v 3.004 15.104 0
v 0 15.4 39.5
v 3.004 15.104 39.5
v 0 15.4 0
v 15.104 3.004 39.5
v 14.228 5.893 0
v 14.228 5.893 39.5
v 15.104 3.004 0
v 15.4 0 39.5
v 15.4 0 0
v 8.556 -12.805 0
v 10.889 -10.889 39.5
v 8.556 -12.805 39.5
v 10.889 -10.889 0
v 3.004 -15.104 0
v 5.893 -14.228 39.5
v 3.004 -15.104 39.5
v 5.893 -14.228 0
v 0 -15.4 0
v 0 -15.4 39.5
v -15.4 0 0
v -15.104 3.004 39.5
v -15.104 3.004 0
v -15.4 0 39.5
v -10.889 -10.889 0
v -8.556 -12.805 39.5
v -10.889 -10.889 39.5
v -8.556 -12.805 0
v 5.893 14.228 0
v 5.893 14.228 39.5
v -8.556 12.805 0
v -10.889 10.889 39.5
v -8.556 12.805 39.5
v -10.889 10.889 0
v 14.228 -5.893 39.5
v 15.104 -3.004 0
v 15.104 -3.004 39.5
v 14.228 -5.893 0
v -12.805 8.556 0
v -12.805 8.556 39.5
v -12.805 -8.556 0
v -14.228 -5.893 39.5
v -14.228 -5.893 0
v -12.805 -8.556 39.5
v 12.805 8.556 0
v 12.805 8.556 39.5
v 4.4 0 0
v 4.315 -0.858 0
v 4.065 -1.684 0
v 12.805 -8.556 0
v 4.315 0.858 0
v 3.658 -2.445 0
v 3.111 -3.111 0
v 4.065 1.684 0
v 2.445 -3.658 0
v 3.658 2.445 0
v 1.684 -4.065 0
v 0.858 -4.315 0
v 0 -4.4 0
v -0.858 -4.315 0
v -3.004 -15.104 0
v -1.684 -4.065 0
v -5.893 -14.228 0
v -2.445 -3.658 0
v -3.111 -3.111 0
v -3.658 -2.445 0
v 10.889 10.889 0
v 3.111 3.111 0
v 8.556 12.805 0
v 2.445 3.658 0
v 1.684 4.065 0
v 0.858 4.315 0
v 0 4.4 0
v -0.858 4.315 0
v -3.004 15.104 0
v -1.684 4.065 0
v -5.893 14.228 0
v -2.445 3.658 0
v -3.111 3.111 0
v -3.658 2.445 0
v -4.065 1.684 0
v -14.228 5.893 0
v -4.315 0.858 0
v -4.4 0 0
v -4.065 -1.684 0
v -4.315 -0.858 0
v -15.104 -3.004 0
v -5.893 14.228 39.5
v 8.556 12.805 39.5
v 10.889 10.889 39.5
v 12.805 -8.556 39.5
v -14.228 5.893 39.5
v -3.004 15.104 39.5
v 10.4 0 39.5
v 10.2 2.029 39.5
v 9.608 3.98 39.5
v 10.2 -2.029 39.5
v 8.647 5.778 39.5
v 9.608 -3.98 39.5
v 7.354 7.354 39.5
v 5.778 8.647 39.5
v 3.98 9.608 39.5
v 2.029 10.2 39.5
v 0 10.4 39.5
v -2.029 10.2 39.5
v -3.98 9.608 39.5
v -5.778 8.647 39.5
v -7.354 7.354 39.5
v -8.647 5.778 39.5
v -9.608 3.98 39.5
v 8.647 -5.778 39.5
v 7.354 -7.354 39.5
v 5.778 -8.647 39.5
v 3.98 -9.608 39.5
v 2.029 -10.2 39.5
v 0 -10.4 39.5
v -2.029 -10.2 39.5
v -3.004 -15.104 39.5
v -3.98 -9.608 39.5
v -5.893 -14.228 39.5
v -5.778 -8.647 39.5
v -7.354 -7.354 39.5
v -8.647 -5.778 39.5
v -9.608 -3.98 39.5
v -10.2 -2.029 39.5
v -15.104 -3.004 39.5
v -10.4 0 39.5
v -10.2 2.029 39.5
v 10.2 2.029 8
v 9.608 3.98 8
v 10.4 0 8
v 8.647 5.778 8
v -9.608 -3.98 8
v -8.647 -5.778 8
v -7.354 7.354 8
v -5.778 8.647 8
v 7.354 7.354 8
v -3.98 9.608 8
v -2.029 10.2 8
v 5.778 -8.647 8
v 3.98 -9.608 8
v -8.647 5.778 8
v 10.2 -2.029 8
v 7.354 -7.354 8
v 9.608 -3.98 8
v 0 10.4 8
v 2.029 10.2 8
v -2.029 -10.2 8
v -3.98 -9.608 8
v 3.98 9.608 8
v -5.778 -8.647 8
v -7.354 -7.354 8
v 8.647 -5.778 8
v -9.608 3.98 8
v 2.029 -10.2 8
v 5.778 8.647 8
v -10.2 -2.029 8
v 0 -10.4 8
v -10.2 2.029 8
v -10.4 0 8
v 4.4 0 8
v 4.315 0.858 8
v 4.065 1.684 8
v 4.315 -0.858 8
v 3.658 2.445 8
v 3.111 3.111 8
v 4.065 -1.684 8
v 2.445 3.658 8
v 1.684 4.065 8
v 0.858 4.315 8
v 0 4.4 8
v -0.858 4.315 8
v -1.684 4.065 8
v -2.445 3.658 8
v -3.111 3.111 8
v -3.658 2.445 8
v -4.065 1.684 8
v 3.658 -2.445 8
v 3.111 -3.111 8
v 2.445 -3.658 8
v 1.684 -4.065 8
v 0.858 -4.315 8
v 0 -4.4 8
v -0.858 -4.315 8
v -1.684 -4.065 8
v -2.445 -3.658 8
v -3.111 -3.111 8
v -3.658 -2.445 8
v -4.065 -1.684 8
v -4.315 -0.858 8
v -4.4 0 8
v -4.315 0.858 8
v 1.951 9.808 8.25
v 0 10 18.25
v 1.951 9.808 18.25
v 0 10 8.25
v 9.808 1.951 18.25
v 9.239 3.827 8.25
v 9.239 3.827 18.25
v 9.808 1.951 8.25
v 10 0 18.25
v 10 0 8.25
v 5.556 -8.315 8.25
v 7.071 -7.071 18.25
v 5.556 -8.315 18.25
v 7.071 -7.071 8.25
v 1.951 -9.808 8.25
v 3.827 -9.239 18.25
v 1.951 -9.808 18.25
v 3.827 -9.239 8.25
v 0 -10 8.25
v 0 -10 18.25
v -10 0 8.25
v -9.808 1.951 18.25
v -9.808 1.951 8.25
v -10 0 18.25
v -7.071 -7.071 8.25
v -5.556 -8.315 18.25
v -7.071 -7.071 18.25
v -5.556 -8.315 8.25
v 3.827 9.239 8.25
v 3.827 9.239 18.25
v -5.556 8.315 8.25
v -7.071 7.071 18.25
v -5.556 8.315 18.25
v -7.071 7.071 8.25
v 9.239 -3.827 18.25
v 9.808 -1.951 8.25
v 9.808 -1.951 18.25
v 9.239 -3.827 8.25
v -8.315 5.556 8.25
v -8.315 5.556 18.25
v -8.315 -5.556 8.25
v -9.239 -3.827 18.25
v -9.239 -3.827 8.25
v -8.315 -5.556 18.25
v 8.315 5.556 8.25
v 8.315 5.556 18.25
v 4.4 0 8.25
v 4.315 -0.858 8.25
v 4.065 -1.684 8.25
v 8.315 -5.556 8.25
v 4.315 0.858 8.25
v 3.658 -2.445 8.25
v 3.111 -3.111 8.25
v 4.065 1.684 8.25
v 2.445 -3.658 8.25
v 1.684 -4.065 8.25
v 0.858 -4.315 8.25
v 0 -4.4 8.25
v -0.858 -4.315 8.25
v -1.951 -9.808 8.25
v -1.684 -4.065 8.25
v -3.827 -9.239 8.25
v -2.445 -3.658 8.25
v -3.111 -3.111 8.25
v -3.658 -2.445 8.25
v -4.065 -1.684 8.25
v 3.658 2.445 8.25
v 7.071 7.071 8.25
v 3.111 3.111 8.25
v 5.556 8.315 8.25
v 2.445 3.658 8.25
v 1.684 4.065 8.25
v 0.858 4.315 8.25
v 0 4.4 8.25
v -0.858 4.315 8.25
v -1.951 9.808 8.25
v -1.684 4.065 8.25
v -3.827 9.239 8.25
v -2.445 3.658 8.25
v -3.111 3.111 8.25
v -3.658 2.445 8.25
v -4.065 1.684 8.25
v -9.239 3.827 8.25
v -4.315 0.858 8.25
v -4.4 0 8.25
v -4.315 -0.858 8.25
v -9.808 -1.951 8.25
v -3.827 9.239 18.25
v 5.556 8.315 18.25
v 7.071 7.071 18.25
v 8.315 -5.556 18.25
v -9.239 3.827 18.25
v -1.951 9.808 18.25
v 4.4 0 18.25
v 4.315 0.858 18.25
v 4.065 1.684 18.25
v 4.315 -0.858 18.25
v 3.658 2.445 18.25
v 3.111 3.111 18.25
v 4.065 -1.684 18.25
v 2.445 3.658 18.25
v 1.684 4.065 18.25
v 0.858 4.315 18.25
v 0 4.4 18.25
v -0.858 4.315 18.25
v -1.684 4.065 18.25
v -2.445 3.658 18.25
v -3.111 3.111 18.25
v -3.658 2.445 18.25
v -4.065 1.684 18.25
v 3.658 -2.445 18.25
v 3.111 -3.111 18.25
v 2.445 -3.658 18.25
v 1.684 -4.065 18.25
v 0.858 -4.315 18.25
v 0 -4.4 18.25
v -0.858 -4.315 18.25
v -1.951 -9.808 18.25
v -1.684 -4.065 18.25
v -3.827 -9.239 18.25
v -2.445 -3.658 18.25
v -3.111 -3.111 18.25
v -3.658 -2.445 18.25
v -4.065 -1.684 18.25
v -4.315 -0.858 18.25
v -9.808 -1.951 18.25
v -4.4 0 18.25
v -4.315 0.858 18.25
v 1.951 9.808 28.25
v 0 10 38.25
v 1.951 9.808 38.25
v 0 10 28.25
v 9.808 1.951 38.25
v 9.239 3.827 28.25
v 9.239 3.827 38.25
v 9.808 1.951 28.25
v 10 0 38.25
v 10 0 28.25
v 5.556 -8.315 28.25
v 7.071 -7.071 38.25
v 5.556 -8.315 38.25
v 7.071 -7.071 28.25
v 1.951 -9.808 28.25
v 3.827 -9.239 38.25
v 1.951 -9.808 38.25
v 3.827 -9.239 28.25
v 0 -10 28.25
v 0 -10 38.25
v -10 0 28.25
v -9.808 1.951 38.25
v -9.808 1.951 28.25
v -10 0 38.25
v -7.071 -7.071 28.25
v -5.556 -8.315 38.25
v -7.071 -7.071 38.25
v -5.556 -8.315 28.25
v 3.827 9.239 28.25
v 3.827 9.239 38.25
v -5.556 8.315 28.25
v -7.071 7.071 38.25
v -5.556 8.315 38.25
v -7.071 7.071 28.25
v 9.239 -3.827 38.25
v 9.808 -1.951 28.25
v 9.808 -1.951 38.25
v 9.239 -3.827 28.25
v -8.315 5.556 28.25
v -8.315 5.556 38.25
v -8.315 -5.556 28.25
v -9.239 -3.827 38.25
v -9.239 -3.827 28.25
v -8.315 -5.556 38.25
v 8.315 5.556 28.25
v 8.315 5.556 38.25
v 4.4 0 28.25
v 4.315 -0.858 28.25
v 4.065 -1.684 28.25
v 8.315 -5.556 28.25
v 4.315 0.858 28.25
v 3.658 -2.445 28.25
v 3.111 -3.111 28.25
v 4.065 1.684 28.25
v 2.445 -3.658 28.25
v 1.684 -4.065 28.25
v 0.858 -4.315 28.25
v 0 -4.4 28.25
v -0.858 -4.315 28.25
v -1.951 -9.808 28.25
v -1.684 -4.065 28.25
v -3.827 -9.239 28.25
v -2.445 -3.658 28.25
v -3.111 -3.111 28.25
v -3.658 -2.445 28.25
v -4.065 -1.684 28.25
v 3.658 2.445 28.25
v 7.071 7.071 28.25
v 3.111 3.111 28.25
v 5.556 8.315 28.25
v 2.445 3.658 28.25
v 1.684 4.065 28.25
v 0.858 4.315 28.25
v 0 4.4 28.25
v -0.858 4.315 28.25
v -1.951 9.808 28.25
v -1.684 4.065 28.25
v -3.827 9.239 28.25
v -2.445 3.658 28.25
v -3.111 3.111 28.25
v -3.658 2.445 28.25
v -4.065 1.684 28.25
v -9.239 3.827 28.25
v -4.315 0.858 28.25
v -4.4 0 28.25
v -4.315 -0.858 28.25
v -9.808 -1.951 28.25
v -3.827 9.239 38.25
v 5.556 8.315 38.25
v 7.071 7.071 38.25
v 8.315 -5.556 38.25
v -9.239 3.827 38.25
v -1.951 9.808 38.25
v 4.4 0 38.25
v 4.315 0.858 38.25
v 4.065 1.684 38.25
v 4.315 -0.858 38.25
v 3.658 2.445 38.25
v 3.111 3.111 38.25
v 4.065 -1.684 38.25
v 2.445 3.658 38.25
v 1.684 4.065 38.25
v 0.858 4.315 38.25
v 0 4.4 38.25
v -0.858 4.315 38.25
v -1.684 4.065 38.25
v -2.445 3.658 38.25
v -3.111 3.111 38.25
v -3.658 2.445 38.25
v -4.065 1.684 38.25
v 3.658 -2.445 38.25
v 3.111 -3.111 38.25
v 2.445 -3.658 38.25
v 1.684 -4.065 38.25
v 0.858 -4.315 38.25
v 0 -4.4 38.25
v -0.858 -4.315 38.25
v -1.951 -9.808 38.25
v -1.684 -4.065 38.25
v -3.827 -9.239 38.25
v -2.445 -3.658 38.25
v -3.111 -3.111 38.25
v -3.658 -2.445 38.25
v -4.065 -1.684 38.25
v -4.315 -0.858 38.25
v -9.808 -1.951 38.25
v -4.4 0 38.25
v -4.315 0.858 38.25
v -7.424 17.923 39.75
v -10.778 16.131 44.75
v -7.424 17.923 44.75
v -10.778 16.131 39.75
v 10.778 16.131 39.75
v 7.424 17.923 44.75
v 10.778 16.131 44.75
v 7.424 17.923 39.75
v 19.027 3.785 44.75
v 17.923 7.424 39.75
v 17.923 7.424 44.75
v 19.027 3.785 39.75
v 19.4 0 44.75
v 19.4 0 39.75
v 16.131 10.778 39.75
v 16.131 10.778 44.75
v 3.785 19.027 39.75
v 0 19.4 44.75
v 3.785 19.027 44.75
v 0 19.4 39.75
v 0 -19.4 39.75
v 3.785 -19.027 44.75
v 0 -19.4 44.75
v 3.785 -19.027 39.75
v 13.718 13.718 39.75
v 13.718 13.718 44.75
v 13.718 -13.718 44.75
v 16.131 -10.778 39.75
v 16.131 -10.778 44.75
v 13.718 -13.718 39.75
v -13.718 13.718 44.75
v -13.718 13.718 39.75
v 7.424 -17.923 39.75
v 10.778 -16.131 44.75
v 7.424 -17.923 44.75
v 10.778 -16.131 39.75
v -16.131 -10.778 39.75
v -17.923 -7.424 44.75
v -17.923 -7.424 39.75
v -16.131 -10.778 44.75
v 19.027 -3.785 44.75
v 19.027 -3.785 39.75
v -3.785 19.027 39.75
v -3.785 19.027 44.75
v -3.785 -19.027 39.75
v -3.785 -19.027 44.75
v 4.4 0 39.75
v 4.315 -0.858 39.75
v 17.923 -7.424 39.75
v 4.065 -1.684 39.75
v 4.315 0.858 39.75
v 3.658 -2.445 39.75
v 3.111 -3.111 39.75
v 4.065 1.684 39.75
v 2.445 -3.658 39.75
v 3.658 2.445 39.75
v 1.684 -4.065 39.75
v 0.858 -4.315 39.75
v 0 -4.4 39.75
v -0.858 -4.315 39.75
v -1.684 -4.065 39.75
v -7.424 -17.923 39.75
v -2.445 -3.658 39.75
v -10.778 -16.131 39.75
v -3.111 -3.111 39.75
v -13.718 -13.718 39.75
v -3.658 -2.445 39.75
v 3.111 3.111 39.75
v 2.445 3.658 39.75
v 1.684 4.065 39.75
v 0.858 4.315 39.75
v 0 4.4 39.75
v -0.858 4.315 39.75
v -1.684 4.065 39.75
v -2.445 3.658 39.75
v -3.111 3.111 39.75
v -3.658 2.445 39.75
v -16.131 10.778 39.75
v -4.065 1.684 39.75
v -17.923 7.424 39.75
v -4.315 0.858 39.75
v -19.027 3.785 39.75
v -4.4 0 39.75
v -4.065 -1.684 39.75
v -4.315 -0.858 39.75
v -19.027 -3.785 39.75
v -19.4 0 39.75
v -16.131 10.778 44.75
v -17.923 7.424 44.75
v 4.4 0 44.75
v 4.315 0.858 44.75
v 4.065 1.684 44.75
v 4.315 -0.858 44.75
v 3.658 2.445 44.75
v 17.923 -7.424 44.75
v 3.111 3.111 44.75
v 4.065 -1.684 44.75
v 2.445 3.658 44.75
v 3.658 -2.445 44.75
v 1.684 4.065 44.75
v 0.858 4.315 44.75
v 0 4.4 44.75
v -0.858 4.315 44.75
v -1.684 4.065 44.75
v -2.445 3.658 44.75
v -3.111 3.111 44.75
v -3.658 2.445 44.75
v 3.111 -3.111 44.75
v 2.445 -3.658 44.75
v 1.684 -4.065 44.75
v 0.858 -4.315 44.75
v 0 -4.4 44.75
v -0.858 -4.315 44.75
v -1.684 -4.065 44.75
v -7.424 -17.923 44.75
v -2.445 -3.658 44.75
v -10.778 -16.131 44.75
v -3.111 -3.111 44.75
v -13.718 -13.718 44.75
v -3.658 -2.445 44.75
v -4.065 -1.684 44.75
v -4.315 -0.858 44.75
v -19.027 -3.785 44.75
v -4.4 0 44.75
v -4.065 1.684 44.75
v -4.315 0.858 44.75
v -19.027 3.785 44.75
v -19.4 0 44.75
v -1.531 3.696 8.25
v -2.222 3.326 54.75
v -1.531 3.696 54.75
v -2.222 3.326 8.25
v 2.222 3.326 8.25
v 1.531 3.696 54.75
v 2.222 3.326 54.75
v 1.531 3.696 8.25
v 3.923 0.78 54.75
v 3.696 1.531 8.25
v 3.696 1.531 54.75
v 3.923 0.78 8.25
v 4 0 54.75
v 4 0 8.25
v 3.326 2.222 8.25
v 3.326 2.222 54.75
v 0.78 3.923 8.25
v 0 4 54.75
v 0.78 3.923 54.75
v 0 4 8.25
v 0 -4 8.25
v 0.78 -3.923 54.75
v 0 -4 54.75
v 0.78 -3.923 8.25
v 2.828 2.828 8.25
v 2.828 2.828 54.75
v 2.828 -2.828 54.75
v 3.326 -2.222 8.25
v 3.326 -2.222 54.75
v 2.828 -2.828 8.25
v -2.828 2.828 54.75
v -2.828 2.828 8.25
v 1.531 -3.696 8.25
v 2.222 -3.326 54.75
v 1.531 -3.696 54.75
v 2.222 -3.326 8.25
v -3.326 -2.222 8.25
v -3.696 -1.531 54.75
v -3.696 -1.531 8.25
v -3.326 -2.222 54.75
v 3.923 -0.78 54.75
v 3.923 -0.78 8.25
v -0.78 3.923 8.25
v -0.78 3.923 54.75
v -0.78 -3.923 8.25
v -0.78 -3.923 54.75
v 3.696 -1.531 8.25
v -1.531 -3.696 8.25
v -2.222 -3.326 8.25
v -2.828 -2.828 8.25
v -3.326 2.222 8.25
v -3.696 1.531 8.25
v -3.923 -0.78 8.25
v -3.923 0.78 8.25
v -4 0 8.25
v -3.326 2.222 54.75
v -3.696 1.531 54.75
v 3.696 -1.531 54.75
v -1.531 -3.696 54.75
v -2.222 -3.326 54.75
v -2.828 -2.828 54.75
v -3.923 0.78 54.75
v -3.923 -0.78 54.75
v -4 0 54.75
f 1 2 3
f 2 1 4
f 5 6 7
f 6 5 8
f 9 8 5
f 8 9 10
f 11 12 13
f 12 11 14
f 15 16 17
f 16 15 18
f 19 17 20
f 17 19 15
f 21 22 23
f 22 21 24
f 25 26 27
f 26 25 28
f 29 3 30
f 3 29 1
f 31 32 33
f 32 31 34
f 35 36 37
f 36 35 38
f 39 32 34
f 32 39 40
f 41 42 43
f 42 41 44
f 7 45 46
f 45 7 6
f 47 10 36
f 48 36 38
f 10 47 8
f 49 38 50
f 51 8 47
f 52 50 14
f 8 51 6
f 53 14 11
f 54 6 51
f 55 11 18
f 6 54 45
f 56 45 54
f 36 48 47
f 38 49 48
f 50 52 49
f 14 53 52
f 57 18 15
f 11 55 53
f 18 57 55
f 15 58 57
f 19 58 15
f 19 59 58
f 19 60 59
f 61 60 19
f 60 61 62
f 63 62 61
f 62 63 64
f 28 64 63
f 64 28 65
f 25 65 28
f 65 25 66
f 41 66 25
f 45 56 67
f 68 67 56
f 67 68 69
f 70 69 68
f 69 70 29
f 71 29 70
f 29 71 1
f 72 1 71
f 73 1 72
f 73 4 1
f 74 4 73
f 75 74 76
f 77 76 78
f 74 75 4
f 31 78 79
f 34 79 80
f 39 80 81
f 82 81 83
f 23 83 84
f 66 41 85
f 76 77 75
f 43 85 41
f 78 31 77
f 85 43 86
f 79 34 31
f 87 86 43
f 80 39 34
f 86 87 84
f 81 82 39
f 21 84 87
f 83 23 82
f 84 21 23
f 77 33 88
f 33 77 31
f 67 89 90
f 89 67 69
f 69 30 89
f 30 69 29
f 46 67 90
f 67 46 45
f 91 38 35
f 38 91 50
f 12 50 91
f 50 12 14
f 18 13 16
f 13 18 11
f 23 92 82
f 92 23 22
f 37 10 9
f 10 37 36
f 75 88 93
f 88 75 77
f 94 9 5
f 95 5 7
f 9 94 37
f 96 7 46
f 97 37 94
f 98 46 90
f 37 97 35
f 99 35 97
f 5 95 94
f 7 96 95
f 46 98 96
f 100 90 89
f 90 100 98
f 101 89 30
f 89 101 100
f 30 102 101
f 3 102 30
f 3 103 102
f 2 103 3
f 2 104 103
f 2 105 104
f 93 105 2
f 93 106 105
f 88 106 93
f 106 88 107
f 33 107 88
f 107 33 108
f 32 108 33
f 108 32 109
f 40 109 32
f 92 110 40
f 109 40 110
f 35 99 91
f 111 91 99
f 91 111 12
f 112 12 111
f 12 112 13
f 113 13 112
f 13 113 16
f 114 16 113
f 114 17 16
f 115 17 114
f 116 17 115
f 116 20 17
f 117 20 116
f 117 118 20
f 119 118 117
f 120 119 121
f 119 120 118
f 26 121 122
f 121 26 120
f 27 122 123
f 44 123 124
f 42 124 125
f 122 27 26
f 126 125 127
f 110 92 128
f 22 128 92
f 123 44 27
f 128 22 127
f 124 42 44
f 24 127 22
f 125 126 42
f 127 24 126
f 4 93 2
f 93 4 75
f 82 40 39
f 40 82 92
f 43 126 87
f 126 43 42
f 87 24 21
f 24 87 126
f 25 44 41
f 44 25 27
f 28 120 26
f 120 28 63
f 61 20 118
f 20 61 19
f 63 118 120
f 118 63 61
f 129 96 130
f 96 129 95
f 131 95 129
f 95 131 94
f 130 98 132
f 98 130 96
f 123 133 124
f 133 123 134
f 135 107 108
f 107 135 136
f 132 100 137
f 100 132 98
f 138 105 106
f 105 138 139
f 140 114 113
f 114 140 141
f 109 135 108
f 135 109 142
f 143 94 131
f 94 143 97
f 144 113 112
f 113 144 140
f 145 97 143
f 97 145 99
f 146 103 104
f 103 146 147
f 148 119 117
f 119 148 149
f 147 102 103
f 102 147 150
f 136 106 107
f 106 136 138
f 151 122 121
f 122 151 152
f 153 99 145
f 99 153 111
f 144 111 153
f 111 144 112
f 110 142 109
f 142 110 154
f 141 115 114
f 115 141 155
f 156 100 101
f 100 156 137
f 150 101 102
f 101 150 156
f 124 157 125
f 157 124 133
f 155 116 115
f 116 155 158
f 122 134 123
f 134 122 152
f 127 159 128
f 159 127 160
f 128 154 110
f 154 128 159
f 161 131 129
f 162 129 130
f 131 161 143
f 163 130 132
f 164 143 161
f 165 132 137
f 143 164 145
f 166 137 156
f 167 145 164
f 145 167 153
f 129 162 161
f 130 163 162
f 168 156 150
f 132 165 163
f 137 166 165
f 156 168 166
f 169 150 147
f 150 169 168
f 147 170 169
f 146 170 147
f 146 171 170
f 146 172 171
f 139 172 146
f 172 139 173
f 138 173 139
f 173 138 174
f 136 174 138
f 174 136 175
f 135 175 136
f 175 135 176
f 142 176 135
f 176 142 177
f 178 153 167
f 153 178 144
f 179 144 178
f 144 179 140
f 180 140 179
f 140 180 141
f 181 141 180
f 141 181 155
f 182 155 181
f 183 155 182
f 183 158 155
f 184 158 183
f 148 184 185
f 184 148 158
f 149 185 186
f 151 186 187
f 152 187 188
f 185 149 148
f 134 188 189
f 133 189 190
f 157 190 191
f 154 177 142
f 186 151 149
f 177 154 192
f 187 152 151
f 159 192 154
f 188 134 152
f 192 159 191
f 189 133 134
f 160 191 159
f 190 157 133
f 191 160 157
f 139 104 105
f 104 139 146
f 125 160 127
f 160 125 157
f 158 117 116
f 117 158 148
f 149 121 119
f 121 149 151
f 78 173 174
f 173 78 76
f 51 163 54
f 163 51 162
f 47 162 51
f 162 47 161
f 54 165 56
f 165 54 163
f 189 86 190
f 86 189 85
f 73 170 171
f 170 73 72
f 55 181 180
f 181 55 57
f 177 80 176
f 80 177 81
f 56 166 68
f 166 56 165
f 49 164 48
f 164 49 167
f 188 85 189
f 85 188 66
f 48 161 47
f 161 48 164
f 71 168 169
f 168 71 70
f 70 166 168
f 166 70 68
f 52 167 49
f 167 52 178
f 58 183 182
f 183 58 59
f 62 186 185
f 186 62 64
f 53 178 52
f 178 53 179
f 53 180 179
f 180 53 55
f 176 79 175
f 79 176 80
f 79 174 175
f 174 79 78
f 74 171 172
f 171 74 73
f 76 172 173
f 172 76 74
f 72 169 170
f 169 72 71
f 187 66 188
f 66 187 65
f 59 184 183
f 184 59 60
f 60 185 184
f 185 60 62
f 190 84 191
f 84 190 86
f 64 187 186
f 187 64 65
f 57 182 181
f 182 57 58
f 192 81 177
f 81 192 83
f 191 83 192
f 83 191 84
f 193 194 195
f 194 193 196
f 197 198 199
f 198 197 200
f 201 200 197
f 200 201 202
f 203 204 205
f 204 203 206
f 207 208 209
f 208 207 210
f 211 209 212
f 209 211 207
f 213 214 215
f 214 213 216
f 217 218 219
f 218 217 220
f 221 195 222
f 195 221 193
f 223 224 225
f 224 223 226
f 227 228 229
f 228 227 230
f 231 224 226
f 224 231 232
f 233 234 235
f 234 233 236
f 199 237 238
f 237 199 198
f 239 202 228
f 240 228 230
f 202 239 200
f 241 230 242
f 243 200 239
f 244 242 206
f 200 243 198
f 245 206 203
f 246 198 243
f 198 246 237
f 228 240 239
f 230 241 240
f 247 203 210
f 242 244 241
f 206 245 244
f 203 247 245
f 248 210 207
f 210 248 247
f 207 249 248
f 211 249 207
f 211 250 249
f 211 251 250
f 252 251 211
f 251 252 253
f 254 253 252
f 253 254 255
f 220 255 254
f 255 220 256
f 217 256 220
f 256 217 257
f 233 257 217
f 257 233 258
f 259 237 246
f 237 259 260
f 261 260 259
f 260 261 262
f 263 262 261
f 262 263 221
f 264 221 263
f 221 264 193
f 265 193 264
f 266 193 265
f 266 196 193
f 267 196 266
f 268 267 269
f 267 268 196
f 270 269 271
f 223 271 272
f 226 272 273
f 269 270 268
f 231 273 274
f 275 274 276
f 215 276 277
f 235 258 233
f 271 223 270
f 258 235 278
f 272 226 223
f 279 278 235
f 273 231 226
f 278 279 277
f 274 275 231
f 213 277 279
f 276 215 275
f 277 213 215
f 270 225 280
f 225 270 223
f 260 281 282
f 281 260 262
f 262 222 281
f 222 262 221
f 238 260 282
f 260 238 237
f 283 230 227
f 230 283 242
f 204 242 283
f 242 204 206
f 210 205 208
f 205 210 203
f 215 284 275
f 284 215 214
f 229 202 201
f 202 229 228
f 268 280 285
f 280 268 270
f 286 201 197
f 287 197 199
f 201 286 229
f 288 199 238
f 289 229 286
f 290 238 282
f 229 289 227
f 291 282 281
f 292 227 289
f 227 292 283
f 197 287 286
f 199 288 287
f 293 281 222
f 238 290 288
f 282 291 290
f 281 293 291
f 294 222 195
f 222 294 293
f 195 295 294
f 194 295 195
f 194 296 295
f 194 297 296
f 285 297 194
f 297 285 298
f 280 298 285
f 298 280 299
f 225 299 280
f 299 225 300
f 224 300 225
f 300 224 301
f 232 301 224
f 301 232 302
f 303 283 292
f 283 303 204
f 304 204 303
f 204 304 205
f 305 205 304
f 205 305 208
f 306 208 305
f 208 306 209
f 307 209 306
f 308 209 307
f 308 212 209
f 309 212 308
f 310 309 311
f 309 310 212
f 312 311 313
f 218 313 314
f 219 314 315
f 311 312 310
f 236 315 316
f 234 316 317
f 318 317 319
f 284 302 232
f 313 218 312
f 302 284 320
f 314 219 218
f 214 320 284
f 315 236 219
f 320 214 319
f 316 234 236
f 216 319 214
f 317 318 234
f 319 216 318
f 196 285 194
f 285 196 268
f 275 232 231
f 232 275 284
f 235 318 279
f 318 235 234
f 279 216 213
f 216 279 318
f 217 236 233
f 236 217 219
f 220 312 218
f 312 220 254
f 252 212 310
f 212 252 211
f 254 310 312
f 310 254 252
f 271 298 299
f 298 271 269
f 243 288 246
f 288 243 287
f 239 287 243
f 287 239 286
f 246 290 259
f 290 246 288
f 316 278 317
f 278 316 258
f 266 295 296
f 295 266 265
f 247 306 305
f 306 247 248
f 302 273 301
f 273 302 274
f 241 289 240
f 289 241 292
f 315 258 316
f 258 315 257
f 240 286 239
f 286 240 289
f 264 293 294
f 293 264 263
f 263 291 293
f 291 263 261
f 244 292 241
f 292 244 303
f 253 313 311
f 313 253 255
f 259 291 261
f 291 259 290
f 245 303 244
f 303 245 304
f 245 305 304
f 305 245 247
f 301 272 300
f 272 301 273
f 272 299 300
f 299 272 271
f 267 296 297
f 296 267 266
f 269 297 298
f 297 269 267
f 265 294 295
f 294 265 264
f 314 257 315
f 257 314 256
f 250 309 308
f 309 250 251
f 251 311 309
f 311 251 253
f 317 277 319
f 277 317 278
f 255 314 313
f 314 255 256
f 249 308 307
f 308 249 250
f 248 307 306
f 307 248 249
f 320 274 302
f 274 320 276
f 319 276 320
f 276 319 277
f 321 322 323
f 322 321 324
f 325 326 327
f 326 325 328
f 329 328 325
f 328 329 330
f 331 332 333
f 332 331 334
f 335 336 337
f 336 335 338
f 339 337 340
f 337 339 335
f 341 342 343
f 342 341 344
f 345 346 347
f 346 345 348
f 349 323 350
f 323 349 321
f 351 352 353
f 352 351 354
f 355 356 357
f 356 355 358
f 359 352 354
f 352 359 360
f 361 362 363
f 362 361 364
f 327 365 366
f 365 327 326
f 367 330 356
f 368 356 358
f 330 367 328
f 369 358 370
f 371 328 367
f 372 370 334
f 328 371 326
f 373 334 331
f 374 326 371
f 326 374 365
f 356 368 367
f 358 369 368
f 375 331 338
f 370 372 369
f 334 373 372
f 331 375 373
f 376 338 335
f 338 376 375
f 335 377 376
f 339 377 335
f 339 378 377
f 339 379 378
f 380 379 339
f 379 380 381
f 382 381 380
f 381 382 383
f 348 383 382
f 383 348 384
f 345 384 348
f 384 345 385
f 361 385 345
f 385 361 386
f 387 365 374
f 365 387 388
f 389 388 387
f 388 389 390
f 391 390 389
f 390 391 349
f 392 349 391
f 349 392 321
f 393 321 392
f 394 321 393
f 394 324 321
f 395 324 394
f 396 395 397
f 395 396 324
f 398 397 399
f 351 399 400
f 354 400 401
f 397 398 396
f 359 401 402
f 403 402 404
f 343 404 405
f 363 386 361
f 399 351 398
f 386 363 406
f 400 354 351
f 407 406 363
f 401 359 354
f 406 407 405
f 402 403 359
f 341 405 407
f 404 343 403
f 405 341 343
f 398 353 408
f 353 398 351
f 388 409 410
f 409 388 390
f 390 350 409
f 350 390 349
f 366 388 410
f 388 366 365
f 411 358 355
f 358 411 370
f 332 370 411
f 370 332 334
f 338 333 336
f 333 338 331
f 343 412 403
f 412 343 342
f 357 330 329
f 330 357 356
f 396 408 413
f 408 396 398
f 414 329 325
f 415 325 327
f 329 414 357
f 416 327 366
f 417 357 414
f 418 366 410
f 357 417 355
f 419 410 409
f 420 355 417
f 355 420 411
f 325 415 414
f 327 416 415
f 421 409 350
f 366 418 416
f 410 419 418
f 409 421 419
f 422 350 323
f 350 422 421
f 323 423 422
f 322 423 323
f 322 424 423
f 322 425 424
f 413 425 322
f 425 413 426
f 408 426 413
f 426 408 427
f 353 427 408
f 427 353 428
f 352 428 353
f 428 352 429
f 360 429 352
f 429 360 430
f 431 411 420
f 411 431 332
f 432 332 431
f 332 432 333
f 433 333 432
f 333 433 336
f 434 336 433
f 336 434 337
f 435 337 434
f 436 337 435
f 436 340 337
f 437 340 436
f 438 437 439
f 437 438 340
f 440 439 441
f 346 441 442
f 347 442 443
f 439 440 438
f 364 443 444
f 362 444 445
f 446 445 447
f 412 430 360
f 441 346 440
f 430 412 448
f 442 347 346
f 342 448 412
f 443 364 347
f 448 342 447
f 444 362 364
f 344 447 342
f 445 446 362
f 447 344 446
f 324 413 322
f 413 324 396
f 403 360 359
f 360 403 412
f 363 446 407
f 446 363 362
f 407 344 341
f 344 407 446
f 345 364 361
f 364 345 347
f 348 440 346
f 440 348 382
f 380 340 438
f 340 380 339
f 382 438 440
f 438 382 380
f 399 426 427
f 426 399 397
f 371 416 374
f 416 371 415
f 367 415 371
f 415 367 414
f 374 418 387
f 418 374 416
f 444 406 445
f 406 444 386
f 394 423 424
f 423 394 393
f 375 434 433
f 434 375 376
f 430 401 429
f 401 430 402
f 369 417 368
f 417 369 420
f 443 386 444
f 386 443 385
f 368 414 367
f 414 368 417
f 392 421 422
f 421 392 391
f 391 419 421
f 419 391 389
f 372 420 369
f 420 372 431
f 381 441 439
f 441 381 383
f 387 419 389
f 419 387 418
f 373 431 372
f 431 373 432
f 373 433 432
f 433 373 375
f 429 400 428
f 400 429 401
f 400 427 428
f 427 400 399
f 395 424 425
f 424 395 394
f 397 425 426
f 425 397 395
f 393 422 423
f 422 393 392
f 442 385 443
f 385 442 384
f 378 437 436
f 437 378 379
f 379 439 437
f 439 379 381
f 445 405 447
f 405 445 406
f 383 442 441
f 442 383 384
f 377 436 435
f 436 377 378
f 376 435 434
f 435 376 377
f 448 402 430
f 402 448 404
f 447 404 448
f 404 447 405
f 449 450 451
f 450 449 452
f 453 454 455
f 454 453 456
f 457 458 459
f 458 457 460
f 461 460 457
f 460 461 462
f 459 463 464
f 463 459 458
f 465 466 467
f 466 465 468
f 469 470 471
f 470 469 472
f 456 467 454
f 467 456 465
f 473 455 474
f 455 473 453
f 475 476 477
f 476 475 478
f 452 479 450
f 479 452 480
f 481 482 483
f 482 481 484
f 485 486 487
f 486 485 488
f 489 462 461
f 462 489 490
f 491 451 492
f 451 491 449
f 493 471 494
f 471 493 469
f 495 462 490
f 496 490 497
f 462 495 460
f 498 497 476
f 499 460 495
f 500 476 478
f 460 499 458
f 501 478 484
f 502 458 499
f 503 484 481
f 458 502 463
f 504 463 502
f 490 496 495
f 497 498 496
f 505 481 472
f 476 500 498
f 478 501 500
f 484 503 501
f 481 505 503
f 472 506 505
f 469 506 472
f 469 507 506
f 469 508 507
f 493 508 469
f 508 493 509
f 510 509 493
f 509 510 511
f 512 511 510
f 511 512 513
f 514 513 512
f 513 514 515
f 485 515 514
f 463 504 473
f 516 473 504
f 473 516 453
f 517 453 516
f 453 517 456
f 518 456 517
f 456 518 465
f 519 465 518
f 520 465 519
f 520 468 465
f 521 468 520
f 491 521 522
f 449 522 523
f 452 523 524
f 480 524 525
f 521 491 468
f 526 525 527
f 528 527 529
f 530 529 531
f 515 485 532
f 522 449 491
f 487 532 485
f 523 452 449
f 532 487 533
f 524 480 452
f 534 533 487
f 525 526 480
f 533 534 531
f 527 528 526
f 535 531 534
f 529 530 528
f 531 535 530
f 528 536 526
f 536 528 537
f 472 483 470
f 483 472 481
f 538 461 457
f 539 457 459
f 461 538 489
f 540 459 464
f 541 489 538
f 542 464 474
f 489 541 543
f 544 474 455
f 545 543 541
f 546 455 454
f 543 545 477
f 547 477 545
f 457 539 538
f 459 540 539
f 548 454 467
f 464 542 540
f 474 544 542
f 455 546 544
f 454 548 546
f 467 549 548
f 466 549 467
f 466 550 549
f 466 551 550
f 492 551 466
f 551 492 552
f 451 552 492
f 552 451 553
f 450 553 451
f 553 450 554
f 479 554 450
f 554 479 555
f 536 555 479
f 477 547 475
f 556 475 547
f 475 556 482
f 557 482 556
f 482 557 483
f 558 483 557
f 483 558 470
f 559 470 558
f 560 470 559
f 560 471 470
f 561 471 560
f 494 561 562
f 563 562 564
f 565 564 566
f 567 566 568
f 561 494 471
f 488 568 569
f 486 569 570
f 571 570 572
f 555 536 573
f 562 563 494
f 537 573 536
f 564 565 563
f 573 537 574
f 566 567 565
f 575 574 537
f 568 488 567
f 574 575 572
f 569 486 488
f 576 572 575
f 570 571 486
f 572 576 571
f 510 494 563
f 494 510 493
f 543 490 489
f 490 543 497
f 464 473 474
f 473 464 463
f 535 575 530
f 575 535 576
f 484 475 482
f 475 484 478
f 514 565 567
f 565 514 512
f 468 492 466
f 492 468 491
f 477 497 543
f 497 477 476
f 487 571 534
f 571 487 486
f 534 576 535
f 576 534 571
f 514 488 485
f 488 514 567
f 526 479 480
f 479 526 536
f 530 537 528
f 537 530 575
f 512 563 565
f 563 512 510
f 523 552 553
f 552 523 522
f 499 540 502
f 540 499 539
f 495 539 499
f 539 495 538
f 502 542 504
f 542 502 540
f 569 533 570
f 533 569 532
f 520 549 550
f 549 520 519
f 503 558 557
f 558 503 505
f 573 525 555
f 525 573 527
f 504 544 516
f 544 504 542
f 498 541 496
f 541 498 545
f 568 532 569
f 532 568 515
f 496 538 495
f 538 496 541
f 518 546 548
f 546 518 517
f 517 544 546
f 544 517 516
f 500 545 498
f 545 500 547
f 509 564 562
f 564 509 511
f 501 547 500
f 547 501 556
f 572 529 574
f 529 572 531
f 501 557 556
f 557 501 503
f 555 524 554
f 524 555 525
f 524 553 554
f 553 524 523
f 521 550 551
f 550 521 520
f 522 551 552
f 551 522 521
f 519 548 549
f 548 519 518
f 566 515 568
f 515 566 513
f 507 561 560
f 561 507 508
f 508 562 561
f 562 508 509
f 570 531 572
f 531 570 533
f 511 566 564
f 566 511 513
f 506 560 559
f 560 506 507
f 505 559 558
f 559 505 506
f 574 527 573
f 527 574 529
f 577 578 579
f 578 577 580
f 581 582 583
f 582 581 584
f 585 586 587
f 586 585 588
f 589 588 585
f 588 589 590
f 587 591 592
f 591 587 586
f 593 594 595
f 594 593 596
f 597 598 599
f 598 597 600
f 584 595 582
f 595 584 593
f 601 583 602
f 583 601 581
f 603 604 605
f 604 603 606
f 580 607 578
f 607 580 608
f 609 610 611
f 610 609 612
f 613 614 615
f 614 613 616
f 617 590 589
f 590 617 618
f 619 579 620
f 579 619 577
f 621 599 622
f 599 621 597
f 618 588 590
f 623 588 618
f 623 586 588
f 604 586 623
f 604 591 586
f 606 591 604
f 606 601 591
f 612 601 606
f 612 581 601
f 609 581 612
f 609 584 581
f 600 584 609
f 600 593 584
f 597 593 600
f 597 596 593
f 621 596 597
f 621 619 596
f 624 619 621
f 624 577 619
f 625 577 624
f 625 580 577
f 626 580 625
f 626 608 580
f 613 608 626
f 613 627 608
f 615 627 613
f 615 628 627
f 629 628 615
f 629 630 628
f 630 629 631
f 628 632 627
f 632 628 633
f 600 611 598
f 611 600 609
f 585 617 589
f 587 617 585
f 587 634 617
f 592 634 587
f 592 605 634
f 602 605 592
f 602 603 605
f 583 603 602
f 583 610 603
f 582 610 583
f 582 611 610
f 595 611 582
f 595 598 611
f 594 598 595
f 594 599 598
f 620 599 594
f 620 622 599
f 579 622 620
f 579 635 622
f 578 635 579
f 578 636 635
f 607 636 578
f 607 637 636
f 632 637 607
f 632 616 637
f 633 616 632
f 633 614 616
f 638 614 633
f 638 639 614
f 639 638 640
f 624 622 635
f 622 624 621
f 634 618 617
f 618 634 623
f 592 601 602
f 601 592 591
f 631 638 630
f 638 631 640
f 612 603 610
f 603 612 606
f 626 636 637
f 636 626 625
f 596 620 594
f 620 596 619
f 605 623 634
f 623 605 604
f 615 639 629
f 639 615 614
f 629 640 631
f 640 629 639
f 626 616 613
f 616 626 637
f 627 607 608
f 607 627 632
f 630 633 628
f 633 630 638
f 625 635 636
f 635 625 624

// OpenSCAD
$fn = 32;

// ------------------------------------------------------------------------
// Shaft station: cup d30.8 x 39.5 mm, shaft d8
// Every part is its own module, assembly() places every instance.
// ------------------------------------------------------------------------

// --- part 1 ---
module housing_cup() {
  difference() {
    cylinder(h = 39.5, d = 30.8);
    translate([0, 0, 8]) cylinder(h = 32.5, d = 20.8);
    translate([0, 0, -1]) cylinder(h = 10, d = 8.8);
  }
}

// --- part 2 ---
module bearing_lower() {
  difference() {
      translate([0, 0, 0]) cylinder(h = 10, d = 20);
      translate([0, 0, -1]) cylinder(h = 12, d = 8.8);
    }
}

// --- part 3 ---
module bearing_upper() {
  difference() {
      translate([0, 0, 0]) cylinder(h = 10, d = 20);
      translate([0, 0, -1]) cylinder(h = 12, d = 8.8);
    }
}

// --- part 4 ---
module station_shaft() {
  translate([0, 0, -23.25]) cylinder(h = 46.5, d = 8);
}

// --- part 5 ---
module station_cover() {
  difference() {
    cylinder(h = 5, d = 38.8);
    translate([0, 0, -1]) cylinder(h = 7, d = 8.8);
  }
}

// --- assembly ---
module assembly() {
  color([0.80, 0.24, 0.20]) translate([0, 0, 0]) rotate([0, 0, 0]) housing_cup();
  color([0.20, 0.45, 0.75]) translate([0, 0, 8.25]) rotate([0, 0, 0]) bearing_lower();
  color([0.25, 0.62, 0.32]) translate([0, 0, 28.25]) rotate([0, 0, 0]) bearing_upper();
  color([0.92, 0.70, 0.18]) translate([0, 0, 31.5]) rotate([0, 0, 0]) station_shaft();
  color([0.58, 0.35, 0.70]) translate([0, 0, 39.75]) rotate([0, 0, 0]) station_cover();
}

assembly();
